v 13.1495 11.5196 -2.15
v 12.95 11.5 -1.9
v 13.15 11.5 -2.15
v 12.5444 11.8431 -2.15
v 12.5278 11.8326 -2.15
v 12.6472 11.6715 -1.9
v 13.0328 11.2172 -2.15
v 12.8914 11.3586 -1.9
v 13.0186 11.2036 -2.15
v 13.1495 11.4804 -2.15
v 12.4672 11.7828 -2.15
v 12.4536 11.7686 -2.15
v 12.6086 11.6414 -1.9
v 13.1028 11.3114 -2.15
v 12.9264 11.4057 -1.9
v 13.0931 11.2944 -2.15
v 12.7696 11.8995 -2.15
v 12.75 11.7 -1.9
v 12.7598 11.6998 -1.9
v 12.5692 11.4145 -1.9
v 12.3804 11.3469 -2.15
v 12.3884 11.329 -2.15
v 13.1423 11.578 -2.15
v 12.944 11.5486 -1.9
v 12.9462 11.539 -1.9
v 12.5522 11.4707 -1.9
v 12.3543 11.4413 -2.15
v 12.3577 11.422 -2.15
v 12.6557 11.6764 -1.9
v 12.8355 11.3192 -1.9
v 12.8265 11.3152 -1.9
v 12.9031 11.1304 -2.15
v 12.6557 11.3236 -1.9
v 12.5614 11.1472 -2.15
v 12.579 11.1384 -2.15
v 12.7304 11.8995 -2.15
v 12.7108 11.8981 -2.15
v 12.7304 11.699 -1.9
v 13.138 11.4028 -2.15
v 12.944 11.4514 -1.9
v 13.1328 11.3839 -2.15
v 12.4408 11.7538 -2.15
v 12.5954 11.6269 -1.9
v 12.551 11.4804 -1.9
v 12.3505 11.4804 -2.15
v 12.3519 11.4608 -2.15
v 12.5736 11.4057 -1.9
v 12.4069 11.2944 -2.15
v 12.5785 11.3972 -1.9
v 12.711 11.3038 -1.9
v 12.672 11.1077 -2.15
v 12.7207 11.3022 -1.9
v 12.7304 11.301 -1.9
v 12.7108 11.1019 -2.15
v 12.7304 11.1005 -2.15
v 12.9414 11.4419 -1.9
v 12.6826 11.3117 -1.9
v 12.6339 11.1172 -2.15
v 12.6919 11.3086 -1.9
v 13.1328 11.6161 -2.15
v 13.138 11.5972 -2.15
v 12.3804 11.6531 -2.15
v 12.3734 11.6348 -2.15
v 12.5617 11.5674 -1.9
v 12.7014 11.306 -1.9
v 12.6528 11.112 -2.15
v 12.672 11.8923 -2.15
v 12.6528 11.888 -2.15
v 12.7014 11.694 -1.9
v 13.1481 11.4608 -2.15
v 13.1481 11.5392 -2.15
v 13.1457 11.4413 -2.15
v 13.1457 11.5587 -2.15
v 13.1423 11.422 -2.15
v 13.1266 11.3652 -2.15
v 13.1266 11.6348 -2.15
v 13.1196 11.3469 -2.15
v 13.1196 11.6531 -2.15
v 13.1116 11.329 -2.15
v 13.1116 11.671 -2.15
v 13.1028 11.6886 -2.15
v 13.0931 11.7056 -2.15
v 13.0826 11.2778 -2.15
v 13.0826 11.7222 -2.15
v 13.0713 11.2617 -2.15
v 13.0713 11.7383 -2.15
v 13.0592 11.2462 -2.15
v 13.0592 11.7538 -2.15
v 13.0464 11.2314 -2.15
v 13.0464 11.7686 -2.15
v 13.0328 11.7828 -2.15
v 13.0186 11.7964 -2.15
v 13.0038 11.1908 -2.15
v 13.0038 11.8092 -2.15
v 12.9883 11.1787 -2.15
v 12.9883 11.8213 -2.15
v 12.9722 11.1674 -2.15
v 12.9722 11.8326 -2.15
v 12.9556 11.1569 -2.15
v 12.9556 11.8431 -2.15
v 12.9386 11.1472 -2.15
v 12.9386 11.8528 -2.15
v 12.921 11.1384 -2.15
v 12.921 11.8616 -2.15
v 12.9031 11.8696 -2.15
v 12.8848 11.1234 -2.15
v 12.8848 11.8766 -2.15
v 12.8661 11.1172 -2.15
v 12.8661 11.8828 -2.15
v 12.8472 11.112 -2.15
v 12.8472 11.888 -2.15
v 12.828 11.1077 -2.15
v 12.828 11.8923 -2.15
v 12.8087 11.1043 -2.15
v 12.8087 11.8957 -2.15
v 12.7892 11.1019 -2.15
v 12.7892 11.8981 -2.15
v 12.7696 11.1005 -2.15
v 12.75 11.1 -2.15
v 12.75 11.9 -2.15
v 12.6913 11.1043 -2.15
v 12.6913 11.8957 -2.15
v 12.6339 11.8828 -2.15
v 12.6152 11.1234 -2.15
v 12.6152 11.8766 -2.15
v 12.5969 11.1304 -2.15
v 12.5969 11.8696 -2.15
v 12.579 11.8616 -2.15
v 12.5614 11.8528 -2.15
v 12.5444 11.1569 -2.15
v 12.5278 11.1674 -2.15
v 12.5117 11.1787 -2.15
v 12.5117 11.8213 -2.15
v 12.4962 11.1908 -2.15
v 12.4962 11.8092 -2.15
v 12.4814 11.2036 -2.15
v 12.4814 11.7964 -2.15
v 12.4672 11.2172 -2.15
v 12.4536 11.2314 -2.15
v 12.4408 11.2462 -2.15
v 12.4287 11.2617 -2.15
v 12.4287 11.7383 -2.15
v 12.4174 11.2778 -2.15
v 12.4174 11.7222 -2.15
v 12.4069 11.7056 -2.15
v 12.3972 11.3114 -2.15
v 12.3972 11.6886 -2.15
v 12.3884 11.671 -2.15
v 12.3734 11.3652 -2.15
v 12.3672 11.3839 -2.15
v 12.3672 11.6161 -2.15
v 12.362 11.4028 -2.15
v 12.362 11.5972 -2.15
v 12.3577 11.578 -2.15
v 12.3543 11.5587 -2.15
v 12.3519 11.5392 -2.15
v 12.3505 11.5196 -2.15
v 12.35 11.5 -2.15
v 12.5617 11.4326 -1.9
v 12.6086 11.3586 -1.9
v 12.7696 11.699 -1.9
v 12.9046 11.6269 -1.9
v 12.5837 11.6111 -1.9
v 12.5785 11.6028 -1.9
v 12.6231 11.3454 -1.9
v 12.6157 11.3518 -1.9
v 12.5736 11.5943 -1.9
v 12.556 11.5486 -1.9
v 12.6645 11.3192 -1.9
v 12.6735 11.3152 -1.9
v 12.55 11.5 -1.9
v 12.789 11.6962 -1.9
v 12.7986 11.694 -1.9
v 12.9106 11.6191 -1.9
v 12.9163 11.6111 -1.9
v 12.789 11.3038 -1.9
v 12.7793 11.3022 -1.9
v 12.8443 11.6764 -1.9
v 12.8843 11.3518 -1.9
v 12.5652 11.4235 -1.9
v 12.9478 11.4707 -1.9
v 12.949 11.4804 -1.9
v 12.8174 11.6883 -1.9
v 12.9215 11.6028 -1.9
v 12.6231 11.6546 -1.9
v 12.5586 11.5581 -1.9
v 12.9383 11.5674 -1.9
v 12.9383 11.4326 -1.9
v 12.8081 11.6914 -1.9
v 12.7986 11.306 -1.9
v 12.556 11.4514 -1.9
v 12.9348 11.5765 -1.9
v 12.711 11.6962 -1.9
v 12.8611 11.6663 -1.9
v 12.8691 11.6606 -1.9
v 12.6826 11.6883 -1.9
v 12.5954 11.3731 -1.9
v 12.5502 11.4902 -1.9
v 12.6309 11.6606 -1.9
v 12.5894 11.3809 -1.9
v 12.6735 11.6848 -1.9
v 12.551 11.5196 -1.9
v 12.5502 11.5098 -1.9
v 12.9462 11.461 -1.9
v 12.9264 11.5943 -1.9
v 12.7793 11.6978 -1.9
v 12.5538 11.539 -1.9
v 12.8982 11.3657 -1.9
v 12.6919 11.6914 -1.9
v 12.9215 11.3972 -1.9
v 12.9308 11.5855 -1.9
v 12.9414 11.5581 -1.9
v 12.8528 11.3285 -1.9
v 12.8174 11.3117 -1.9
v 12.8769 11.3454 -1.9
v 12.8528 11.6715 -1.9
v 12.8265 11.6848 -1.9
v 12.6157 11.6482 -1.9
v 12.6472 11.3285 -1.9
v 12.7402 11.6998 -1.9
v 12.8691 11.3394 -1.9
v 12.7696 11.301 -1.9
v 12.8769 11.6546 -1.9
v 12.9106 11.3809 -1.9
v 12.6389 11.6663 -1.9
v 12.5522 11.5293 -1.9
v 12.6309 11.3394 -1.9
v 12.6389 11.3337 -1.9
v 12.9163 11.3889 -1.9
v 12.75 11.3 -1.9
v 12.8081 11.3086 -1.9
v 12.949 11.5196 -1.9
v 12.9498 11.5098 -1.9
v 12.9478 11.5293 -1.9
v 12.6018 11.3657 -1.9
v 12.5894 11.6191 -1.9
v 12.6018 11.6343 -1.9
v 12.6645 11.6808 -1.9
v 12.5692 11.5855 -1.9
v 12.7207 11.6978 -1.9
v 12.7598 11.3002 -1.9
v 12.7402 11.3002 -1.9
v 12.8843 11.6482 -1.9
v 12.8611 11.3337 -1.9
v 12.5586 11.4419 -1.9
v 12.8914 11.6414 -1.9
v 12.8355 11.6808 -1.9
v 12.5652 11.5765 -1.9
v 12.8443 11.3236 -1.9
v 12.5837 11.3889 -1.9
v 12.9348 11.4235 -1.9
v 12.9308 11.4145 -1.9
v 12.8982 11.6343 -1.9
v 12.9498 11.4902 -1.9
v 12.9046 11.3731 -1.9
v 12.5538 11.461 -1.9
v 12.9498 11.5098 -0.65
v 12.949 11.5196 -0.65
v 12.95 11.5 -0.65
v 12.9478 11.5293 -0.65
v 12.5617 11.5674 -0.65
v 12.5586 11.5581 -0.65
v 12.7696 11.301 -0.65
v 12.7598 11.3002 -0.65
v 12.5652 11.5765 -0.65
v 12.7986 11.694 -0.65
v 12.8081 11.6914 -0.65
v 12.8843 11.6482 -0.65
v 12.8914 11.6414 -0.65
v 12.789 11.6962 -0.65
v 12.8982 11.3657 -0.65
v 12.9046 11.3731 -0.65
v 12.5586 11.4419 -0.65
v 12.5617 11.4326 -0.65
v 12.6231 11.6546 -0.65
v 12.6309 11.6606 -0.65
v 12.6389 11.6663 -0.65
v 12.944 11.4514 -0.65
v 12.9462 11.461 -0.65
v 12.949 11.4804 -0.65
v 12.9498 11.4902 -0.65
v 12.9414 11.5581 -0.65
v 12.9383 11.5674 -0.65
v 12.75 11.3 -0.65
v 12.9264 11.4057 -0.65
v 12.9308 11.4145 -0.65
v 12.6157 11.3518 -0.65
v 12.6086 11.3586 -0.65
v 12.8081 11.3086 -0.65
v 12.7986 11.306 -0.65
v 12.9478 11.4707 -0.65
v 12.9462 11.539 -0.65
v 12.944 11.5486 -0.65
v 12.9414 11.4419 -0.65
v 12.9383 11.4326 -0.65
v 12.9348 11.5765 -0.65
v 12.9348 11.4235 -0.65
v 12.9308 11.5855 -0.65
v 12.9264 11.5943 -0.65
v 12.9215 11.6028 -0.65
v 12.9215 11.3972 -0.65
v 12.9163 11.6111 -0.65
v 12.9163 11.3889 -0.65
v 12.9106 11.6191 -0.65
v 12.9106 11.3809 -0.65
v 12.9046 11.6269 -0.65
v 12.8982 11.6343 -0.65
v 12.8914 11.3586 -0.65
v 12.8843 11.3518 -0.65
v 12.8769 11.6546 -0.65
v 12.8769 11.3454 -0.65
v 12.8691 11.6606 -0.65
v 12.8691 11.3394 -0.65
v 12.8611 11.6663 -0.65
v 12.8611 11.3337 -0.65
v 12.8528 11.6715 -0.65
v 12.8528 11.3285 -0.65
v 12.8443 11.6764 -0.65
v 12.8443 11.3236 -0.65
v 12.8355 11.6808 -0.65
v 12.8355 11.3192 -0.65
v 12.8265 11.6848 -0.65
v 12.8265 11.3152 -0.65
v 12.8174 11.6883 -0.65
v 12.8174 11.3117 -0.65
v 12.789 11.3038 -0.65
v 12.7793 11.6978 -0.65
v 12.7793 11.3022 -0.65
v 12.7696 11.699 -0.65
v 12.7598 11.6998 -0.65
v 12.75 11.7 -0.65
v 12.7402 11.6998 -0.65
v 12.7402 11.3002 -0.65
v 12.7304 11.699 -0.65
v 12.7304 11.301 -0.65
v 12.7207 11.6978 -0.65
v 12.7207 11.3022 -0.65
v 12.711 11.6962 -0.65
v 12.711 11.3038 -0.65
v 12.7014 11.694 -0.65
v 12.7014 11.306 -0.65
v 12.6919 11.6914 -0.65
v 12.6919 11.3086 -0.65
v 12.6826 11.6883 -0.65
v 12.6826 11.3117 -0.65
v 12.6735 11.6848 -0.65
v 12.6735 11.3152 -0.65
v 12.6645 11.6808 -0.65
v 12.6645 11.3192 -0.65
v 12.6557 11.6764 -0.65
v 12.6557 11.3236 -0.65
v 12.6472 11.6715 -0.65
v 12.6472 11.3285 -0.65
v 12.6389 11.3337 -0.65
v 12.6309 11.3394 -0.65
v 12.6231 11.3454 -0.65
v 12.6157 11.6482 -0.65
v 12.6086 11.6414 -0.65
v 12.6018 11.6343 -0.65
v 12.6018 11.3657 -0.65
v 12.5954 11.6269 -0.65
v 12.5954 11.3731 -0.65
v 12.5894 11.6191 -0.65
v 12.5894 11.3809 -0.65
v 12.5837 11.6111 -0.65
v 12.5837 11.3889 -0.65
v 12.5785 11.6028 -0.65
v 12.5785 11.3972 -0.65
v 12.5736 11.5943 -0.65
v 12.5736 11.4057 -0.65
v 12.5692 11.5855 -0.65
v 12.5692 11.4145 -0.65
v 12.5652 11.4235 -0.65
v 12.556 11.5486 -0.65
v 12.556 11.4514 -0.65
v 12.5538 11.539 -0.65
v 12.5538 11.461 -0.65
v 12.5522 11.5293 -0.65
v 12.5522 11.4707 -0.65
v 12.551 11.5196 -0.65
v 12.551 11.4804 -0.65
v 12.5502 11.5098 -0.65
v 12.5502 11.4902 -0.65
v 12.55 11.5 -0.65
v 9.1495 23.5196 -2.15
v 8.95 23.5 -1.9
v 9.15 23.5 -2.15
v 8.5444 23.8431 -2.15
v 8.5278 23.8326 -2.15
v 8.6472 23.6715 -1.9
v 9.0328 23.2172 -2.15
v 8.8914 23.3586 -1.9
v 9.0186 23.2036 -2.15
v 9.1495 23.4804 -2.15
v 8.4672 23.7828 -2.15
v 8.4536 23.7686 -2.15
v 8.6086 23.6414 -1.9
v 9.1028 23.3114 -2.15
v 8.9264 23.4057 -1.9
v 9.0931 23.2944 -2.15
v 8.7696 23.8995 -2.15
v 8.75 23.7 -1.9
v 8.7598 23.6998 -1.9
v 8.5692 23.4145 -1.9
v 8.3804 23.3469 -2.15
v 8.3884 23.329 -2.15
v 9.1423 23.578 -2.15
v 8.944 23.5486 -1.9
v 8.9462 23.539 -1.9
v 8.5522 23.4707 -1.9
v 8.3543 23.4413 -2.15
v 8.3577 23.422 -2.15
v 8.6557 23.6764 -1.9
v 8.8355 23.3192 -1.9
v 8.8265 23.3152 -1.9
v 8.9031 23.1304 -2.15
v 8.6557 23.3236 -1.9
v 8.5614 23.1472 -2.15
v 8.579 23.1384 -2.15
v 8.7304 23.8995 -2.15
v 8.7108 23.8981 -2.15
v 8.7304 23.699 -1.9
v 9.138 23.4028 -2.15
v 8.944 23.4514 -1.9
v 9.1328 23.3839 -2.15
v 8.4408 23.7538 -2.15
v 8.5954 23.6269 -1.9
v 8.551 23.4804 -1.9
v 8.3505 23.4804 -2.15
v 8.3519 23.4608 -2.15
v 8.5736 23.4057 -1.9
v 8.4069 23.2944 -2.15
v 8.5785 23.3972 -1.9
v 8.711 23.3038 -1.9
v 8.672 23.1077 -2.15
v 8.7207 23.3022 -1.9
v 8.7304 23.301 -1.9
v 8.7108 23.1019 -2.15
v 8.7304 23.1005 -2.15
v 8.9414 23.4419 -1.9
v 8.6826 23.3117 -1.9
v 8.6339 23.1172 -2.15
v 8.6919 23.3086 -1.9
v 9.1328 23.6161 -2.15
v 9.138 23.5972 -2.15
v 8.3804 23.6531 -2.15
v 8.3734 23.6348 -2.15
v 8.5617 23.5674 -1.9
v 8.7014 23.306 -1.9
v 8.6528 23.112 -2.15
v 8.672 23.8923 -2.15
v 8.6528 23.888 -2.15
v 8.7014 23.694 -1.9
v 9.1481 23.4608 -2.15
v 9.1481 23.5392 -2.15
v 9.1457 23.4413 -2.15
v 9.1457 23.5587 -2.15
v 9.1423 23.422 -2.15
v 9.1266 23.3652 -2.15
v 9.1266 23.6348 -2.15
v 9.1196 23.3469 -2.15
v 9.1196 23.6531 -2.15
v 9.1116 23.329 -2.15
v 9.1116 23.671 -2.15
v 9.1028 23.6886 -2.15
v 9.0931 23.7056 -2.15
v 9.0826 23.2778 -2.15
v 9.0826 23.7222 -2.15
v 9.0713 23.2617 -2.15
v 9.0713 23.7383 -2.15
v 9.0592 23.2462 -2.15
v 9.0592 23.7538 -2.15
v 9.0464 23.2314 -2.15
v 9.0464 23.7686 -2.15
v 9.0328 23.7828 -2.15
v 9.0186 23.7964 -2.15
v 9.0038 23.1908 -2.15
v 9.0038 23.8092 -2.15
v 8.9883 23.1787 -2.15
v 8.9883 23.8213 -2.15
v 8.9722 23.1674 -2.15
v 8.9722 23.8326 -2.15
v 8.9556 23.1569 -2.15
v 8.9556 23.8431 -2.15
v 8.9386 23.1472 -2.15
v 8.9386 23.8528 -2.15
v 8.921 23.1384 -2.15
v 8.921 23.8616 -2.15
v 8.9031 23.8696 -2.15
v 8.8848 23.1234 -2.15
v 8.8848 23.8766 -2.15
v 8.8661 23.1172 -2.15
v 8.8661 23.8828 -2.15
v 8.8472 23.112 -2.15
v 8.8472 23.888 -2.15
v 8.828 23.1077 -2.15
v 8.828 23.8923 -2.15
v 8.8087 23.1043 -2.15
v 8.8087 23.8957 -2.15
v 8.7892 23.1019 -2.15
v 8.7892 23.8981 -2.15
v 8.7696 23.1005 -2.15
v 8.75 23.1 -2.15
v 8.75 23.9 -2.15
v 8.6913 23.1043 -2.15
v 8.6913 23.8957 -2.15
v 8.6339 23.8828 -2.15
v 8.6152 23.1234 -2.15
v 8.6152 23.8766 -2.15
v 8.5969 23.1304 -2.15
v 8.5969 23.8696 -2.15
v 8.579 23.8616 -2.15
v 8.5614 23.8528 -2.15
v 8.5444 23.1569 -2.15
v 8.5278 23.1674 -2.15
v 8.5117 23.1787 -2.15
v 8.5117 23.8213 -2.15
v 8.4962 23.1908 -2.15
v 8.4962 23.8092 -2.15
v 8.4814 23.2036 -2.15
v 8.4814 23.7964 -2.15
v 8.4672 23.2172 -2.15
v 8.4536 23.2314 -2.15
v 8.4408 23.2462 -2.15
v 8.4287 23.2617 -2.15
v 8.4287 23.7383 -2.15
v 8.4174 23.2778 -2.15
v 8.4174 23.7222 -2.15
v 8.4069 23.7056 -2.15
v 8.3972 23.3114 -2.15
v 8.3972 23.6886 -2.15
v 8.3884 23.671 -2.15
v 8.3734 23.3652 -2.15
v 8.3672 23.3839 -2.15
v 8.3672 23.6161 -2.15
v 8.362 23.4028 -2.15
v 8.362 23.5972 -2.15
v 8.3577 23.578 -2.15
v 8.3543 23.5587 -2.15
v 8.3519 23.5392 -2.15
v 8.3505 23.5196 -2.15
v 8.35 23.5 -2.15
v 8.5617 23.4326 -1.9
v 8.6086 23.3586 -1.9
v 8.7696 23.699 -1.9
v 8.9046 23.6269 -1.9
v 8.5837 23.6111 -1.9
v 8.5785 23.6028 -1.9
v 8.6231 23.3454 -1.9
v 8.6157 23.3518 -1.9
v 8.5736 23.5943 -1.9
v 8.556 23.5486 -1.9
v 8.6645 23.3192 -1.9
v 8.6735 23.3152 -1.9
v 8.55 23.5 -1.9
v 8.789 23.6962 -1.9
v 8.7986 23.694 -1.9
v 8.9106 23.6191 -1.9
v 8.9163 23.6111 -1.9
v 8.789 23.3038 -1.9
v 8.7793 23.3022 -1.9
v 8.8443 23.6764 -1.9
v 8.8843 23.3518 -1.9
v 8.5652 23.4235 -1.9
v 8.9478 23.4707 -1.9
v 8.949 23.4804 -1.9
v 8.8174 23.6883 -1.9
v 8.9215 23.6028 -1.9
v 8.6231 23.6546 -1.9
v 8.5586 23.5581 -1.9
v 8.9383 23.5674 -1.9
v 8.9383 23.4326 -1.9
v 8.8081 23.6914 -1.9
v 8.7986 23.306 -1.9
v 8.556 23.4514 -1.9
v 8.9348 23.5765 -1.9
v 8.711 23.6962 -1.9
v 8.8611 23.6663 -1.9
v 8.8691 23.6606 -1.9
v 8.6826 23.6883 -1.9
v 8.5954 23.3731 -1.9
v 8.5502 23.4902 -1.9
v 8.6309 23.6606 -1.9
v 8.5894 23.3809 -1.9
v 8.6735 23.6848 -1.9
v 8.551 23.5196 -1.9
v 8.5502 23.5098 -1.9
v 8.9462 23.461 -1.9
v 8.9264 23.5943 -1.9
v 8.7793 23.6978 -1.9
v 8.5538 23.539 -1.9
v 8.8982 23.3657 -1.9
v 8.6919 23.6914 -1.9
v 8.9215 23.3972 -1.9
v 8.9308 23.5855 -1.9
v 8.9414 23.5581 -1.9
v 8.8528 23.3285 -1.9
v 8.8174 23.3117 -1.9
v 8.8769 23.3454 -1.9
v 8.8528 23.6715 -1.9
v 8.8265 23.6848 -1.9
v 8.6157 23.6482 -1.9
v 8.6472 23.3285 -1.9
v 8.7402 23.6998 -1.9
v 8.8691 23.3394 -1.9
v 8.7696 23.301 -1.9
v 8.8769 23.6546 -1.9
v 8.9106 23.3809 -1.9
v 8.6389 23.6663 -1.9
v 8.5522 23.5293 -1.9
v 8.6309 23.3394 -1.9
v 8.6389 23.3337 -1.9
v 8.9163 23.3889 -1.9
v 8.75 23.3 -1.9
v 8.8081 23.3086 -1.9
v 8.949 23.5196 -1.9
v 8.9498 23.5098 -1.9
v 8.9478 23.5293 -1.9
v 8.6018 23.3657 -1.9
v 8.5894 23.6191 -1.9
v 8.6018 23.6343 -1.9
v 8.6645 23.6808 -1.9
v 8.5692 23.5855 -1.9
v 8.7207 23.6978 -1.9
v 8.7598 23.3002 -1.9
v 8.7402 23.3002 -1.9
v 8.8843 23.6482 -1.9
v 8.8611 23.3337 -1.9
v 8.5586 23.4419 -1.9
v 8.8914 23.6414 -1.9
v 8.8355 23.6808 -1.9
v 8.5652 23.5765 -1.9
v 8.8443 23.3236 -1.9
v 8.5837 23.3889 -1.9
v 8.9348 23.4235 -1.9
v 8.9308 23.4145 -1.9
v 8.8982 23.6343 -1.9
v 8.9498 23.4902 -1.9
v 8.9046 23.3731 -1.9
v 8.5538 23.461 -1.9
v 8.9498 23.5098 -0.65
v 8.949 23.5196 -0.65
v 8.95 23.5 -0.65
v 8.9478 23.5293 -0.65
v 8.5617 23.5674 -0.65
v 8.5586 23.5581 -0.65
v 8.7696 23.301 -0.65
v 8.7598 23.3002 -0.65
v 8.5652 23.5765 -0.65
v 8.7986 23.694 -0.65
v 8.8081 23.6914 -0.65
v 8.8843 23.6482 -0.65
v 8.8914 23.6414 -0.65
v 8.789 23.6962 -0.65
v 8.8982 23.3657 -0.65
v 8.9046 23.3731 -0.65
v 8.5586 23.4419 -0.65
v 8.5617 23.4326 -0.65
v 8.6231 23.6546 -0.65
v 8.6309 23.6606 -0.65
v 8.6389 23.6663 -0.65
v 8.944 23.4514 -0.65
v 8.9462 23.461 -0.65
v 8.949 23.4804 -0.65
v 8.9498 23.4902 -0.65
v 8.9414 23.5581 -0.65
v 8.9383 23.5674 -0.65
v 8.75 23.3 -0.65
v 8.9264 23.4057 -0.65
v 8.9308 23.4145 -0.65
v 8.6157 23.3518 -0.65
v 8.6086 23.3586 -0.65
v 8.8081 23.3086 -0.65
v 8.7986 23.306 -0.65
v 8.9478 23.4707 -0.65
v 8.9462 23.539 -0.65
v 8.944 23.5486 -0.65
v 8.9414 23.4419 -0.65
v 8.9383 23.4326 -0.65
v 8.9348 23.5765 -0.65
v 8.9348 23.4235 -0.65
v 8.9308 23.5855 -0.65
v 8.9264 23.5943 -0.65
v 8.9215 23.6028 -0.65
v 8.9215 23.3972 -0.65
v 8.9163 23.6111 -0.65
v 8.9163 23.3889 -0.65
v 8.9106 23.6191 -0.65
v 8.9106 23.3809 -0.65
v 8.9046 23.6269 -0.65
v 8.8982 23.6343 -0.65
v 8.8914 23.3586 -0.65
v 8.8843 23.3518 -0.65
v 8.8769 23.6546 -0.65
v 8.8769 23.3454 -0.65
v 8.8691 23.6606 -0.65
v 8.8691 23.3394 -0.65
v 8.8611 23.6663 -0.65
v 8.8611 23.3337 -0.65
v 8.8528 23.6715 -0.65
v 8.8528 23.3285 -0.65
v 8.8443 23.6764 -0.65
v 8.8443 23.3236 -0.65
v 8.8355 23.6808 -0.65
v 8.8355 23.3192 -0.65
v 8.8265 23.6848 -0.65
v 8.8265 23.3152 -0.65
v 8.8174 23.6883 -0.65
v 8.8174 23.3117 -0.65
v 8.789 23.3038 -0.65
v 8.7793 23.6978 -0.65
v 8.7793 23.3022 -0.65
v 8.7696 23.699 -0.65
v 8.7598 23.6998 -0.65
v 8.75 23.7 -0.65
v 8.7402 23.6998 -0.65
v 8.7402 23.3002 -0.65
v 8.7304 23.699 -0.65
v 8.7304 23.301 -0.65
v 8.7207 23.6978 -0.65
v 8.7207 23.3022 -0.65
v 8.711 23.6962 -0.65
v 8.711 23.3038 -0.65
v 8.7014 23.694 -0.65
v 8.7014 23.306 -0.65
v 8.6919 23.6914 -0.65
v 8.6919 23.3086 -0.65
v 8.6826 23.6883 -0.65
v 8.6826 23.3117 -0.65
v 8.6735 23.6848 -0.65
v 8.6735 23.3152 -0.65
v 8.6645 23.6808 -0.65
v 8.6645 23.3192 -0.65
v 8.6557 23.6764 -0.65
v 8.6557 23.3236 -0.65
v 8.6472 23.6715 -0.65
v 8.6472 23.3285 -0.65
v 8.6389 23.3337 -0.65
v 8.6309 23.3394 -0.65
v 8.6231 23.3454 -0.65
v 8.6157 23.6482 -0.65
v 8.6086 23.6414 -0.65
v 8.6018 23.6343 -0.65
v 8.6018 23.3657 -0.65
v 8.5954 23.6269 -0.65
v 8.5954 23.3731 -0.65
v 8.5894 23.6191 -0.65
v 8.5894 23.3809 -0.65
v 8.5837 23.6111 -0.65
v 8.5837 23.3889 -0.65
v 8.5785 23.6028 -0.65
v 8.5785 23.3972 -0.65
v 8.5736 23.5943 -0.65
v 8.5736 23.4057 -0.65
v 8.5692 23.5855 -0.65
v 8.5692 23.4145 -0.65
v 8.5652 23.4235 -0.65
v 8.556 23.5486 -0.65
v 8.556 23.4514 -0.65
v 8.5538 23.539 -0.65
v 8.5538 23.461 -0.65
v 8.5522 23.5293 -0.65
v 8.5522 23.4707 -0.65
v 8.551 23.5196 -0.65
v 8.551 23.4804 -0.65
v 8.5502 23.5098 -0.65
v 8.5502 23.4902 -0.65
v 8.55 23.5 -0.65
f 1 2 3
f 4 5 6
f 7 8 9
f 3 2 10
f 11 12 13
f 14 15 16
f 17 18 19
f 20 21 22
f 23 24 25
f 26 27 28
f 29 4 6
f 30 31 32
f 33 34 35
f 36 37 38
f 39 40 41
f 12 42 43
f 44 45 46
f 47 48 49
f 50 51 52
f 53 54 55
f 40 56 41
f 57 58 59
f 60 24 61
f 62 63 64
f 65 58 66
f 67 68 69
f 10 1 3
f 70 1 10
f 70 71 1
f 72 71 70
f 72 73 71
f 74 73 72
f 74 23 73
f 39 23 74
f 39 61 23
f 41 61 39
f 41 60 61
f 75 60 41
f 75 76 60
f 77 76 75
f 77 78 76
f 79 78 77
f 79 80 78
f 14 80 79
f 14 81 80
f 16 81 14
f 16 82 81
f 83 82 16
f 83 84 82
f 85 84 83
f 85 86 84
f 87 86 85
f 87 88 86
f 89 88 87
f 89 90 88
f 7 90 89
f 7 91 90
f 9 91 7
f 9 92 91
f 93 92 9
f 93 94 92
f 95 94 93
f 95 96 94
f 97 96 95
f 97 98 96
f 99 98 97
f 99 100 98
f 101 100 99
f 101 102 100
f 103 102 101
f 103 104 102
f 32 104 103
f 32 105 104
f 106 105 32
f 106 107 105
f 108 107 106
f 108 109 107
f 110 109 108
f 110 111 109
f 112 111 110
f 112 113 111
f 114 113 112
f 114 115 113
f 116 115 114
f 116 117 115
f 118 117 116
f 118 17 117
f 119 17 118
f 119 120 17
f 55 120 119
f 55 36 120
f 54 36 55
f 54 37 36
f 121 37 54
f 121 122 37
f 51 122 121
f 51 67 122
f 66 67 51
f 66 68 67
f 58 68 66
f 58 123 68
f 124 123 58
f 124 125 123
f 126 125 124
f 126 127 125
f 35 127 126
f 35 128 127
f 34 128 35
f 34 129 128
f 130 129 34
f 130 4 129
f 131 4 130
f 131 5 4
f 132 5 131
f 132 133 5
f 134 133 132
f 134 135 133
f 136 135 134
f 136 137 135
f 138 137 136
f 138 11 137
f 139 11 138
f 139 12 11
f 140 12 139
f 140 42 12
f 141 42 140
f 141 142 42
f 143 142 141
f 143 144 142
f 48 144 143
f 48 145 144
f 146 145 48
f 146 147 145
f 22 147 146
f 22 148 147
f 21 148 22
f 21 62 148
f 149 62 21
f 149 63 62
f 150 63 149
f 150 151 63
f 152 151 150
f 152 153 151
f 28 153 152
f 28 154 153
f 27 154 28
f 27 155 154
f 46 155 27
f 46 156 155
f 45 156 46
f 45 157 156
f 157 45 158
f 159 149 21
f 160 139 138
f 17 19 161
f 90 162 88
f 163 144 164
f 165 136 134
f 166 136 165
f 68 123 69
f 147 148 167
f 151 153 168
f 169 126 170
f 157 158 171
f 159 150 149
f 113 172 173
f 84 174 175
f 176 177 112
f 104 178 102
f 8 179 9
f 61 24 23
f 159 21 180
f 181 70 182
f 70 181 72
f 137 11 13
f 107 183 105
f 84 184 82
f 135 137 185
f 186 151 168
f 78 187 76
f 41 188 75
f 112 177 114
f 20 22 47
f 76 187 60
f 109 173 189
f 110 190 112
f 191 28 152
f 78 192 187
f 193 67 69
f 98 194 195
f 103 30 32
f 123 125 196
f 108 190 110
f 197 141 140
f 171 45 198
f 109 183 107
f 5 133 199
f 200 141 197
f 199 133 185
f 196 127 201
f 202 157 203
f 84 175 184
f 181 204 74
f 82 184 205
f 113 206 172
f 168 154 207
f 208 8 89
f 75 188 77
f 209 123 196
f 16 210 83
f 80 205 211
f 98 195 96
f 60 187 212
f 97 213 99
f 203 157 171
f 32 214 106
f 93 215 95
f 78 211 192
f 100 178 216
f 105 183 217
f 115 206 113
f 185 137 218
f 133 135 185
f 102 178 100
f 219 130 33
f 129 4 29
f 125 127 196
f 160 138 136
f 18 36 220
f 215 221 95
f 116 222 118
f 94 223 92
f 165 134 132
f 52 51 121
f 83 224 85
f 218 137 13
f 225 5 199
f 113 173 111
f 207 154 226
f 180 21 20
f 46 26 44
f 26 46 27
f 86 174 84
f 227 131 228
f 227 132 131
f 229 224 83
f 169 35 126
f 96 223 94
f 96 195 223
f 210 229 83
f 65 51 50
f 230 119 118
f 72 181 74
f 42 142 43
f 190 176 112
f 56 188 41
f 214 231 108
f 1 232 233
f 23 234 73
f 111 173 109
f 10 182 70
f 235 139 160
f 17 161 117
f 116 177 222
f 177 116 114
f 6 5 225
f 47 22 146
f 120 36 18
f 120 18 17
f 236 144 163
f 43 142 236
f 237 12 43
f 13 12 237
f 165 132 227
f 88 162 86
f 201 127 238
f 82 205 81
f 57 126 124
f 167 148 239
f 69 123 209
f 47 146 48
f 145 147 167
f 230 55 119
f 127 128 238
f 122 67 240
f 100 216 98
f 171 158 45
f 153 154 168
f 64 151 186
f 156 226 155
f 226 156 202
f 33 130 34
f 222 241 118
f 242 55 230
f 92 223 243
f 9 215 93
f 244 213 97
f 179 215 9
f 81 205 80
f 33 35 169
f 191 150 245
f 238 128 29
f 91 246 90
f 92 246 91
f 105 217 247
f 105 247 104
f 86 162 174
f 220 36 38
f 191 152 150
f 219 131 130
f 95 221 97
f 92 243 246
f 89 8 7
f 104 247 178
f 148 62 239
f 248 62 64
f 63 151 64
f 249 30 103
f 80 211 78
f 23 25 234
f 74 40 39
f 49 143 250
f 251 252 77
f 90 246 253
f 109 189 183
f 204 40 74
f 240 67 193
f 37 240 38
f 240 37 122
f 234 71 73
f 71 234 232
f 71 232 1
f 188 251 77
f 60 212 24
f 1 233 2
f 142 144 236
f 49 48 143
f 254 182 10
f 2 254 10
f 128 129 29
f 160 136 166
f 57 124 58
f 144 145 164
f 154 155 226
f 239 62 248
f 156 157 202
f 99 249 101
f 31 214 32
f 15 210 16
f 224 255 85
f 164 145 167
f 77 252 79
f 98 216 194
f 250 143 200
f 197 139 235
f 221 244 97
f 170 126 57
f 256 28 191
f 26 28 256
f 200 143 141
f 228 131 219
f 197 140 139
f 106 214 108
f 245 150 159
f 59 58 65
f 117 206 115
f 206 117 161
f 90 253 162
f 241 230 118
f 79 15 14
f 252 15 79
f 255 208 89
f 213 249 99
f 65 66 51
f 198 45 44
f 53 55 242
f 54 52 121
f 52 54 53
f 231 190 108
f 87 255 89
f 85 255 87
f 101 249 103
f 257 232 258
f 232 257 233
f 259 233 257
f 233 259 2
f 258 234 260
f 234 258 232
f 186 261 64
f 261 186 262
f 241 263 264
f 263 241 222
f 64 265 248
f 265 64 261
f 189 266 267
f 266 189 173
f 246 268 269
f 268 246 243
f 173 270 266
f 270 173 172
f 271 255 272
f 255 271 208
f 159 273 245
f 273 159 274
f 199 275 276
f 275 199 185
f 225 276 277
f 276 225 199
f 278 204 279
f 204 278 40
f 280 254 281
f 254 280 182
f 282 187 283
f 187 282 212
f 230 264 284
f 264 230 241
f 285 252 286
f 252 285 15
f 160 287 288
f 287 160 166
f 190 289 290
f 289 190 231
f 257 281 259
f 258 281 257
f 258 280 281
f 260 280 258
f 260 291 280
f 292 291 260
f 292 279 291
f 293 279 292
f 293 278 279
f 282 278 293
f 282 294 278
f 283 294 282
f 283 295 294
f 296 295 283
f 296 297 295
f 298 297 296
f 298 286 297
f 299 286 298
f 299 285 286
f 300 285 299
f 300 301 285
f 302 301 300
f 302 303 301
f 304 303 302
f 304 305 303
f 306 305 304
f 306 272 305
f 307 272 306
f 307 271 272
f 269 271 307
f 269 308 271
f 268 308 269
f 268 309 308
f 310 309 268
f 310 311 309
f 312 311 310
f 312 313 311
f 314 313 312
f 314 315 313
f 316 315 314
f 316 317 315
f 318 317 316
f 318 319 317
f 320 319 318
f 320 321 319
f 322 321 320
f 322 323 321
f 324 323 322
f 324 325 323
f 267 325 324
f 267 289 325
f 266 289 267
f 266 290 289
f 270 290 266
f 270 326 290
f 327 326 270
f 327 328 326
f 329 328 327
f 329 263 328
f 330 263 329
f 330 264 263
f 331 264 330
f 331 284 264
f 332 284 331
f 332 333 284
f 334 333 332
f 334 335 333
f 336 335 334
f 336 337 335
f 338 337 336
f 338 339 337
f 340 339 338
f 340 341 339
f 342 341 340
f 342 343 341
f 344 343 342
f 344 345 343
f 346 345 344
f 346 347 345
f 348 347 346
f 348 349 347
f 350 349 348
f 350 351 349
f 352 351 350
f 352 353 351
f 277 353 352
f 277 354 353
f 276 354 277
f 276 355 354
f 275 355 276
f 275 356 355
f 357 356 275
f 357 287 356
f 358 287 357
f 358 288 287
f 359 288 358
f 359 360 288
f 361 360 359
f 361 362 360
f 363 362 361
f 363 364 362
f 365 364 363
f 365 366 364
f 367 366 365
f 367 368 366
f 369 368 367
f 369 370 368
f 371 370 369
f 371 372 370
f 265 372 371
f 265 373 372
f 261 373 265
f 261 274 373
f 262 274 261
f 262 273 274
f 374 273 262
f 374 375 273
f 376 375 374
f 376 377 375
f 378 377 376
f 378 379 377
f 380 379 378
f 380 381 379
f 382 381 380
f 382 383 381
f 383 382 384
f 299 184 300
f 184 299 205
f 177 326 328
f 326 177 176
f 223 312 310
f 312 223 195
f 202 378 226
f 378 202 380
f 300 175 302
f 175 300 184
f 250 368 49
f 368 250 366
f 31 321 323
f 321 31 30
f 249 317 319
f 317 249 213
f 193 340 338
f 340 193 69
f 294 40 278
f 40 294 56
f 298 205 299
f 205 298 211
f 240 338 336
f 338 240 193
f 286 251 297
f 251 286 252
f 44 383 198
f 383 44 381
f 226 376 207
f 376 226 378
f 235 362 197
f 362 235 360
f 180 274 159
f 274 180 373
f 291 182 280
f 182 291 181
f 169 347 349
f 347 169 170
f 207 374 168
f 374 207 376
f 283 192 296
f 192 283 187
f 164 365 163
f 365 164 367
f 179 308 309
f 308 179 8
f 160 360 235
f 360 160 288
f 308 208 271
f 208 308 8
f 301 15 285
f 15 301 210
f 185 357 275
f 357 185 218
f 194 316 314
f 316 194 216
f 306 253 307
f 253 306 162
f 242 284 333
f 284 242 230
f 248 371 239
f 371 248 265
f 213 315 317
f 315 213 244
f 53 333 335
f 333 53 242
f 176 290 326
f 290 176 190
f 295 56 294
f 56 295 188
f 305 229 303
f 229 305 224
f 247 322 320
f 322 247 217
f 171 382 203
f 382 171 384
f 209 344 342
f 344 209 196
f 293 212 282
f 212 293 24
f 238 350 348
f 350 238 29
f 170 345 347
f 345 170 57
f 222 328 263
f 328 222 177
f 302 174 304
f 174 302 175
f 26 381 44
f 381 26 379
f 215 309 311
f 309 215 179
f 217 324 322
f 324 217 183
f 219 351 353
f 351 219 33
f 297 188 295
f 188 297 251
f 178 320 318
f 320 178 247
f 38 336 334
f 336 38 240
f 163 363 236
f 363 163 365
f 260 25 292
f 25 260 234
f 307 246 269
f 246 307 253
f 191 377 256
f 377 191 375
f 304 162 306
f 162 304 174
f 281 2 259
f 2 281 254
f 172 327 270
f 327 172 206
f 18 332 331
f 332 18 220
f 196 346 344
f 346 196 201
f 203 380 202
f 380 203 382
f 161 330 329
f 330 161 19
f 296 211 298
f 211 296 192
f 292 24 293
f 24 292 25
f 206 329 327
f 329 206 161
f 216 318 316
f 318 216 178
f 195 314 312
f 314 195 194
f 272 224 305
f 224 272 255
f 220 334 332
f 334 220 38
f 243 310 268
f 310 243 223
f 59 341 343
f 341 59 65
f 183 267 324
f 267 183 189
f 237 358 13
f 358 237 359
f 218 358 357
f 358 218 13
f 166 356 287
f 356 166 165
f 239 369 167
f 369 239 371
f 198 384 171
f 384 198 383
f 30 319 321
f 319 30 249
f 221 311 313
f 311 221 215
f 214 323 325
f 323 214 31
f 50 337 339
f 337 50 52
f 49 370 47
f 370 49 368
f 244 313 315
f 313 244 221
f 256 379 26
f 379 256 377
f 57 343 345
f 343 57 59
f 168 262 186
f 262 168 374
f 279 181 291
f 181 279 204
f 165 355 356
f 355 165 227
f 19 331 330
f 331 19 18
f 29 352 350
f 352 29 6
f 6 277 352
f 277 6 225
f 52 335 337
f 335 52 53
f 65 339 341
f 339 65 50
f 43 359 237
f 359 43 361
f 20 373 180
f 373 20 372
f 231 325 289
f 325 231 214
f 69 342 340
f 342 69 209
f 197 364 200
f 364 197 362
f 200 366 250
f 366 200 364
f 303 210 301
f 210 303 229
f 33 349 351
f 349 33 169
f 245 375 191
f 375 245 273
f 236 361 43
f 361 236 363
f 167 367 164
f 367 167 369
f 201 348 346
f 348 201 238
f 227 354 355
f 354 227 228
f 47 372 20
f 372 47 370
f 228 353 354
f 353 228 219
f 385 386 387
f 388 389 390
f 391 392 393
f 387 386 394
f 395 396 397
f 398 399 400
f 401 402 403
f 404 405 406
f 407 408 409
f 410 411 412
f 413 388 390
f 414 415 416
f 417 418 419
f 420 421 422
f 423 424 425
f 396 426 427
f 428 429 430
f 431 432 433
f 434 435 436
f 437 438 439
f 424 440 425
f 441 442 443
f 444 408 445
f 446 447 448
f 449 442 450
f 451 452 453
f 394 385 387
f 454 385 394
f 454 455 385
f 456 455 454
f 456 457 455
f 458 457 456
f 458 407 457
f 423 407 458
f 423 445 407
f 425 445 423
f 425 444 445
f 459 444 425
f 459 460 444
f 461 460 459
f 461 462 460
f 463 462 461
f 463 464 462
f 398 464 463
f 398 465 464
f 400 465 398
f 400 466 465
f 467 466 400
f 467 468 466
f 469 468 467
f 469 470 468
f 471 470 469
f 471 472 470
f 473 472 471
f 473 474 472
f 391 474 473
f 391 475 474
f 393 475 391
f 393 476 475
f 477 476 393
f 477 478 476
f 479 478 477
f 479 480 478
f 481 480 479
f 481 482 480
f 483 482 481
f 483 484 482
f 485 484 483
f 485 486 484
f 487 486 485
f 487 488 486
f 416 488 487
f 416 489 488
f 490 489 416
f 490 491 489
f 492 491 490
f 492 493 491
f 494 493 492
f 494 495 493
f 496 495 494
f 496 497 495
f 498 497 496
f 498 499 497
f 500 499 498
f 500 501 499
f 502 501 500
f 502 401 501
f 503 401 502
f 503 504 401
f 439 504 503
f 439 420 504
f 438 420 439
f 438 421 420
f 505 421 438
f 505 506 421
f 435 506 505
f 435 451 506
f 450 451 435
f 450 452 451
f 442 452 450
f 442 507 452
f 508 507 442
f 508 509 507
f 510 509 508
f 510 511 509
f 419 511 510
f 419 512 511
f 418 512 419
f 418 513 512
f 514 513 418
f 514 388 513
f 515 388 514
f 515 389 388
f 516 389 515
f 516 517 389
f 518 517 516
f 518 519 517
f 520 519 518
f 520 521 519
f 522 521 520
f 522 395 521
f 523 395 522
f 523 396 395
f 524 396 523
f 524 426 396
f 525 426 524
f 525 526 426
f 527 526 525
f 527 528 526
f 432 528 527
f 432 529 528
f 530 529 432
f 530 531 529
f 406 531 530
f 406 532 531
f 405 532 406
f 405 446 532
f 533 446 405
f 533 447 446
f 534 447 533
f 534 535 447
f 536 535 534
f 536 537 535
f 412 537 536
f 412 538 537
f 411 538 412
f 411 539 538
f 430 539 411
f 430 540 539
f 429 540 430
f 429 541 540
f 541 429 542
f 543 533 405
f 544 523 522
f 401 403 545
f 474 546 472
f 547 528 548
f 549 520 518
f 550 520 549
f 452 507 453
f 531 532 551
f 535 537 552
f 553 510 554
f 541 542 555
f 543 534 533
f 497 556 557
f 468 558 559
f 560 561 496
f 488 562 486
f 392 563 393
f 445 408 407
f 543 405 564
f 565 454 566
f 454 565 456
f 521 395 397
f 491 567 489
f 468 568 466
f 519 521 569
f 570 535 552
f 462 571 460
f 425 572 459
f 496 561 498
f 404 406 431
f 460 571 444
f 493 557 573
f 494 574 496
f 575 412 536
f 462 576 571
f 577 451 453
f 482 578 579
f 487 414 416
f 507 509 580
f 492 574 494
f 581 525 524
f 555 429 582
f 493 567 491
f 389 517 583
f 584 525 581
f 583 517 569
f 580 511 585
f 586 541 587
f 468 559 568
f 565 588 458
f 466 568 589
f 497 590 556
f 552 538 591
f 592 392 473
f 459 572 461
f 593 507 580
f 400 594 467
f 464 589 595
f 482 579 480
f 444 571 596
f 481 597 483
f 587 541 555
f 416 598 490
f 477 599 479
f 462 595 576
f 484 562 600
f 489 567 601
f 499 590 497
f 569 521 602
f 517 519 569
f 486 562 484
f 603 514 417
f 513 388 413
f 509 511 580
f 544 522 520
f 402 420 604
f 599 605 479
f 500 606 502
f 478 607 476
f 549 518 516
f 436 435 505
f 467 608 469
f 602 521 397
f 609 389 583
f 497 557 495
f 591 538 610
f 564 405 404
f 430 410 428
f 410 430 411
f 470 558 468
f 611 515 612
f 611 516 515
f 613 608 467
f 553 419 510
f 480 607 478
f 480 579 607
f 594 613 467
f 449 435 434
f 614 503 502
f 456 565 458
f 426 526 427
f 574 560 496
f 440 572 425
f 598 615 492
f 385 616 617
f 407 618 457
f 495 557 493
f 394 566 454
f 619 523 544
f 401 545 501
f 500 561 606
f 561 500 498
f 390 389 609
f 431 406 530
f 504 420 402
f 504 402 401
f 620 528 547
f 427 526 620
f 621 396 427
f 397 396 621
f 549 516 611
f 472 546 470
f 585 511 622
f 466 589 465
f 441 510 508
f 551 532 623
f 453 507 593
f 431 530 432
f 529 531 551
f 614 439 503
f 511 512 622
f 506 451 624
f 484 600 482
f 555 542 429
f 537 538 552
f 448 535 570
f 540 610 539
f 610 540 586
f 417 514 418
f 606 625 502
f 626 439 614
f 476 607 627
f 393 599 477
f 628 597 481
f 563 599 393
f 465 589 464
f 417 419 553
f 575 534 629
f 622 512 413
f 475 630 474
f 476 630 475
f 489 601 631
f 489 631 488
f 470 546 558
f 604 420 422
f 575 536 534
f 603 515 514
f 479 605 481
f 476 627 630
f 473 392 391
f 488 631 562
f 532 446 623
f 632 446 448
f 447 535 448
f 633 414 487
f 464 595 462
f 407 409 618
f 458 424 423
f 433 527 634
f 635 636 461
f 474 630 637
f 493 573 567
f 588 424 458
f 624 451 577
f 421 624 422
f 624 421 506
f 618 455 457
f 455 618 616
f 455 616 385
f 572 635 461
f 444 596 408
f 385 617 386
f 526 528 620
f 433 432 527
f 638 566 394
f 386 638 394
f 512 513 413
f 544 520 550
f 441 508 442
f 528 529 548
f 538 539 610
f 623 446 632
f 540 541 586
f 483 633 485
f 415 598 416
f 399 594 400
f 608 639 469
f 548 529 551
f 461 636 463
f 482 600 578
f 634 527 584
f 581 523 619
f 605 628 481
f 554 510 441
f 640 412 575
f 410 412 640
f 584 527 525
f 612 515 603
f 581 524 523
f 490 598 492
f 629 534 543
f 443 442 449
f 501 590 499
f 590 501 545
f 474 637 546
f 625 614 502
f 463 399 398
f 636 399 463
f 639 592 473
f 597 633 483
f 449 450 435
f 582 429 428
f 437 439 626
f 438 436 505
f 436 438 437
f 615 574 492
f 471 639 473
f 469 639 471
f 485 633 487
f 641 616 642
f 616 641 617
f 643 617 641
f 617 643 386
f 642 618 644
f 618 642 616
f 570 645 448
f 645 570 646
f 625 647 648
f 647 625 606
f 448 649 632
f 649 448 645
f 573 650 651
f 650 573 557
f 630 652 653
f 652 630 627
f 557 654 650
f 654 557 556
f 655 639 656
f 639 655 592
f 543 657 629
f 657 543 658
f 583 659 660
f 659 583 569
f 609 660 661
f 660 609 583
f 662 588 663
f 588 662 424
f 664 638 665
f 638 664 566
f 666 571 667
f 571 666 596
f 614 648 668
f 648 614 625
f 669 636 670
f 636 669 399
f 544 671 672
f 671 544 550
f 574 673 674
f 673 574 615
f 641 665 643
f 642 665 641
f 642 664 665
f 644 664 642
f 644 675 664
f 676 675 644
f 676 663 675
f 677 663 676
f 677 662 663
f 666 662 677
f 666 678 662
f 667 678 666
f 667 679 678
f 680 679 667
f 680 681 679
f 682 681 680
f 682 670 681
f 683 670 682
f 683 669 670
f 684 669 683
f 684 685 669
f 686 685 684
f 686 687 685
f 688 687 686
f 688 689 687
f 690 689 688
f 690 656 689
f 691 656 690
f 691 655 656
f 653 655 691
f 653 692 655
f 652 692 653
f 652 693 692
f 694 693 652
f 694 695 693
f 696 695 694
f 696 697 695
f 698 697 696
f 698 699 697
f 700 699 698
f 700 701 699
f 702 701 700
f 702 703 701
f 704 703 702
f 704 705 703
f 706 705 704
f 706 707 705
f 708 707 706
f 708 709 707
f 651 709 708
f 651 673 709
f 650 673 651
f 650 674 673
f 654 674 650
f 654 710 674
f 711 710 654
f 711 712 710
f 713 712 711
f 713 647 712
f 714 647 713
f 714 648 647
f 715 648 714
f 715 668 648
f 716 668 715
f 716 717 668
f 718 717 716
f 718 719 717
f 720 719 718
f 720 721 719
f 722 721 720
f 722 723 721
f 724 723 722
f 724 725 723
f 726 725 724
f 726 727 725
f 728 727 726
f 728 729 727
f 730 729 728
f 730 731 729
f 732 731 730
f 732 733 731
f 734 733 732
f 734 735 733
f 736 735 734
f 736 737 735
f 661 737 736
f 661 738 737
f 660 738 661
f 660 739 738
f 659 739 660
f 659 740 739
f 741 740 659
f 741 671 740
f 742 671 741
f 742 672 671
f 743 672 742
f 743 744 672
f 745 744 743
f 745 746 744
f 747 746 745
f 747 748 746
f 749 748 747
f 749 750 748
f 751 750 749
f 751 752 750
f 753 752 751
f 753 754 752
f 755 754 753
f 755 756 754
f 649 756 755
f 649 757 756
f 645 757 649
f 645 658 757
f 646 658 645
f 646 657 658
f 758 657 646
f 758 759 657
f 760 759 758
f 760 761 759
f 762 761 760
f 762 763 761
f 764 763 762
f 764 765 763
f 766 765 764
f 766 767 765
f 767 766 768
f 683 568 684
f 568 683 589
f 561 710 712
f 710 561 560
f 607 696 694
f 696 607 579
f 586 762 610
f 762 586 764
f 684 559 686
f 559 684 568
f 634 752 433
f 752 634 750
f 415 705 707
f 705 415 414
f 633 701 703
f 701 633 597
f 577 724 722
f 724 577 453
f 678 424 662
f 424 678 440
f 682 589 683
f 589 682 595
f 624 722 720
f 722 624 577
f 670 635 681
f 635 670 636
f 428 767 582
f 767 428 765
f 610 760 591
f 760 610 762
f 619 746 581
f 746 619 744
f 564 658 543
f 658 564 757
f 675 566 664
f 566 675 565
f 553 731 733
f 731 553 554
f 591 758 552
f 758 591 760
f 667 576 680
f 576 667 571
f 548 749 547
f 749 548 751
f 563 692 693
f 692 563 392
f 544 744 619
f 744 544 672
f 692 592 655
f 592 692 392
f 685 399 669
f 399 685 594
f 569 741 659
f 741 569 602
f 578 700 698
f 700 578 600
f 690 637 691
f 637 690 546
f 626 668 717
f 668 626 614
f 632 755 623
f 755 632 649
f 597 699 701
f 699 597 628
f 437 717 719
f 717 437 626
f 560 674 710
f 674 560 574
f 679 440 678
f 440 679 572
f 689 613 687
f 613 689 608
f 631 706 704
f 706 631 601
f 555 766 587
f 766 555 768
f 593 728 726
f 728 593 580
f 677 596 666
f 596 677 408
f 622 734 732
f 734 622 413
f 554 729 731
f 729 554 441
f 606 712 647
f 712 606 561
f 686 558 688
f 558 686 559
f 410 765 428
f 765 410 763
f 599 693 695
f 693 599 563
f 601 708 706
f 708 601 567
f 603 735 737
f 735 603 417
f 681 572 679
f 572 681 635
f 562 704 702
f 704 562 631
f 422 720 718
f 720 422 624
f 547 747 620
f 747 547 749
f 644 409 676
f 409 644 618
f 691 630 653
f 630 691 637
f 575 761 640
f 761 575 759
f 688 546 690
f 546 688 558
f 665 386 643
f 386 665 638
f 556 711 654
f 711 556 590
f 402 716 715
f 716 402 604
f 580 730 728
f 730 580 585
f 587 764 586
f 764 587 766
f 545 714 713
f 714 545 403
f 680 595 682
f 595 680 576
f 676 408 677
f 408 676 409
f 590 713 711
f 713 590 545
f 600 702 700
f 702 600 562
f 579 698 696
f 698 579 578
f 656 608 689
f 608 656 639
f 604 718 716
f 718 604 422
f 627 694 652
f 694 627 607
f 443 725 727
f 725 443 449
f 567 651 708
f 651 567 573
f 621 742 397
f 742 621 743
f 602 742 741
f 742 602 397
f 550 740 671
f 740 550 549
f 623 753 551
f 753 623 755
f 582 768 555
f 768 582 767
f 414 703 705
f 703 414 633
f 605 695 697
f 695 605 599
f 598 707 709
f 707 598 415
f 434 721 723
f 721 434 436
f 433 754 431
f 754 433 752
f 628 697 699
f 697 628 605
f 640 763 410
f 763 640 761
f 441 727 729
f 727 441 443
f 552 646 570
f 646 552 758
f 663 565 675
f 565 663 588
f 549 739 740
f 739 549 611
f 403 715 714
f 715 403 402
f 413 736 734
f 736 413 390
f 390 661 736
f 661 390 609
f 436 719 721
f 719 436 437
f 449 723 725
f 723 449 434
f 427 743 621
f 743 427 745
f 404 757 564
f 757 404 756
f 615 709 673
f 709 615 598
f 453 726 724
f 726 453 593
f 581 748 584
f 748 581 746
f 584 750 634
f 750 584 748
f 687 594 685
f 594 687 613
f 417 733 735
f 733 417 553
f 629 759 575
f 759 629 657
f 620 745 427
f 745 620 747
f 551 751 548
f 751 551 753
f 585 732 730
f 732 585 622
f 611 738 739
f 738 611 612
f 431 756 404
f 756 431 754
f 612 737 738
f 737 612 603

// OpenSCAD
// Import the rounded_poly module
$fn=128;

module screw()
{
    union() {
        cylinder(0.25, 0.4, 0.2);
        cylinder(1.5, 0.2, 0.2);
    }
}

module elec_backplate_fixings()
{
    union()
    {

        //translate([6.25, 17.5,-2.15]) screw();
        translate([12.75, 11.5,-2.15]) screw();
        translate([8.75, 23.5,-2.15]) screw();
    }    
}

elec_backplate_fixings();
